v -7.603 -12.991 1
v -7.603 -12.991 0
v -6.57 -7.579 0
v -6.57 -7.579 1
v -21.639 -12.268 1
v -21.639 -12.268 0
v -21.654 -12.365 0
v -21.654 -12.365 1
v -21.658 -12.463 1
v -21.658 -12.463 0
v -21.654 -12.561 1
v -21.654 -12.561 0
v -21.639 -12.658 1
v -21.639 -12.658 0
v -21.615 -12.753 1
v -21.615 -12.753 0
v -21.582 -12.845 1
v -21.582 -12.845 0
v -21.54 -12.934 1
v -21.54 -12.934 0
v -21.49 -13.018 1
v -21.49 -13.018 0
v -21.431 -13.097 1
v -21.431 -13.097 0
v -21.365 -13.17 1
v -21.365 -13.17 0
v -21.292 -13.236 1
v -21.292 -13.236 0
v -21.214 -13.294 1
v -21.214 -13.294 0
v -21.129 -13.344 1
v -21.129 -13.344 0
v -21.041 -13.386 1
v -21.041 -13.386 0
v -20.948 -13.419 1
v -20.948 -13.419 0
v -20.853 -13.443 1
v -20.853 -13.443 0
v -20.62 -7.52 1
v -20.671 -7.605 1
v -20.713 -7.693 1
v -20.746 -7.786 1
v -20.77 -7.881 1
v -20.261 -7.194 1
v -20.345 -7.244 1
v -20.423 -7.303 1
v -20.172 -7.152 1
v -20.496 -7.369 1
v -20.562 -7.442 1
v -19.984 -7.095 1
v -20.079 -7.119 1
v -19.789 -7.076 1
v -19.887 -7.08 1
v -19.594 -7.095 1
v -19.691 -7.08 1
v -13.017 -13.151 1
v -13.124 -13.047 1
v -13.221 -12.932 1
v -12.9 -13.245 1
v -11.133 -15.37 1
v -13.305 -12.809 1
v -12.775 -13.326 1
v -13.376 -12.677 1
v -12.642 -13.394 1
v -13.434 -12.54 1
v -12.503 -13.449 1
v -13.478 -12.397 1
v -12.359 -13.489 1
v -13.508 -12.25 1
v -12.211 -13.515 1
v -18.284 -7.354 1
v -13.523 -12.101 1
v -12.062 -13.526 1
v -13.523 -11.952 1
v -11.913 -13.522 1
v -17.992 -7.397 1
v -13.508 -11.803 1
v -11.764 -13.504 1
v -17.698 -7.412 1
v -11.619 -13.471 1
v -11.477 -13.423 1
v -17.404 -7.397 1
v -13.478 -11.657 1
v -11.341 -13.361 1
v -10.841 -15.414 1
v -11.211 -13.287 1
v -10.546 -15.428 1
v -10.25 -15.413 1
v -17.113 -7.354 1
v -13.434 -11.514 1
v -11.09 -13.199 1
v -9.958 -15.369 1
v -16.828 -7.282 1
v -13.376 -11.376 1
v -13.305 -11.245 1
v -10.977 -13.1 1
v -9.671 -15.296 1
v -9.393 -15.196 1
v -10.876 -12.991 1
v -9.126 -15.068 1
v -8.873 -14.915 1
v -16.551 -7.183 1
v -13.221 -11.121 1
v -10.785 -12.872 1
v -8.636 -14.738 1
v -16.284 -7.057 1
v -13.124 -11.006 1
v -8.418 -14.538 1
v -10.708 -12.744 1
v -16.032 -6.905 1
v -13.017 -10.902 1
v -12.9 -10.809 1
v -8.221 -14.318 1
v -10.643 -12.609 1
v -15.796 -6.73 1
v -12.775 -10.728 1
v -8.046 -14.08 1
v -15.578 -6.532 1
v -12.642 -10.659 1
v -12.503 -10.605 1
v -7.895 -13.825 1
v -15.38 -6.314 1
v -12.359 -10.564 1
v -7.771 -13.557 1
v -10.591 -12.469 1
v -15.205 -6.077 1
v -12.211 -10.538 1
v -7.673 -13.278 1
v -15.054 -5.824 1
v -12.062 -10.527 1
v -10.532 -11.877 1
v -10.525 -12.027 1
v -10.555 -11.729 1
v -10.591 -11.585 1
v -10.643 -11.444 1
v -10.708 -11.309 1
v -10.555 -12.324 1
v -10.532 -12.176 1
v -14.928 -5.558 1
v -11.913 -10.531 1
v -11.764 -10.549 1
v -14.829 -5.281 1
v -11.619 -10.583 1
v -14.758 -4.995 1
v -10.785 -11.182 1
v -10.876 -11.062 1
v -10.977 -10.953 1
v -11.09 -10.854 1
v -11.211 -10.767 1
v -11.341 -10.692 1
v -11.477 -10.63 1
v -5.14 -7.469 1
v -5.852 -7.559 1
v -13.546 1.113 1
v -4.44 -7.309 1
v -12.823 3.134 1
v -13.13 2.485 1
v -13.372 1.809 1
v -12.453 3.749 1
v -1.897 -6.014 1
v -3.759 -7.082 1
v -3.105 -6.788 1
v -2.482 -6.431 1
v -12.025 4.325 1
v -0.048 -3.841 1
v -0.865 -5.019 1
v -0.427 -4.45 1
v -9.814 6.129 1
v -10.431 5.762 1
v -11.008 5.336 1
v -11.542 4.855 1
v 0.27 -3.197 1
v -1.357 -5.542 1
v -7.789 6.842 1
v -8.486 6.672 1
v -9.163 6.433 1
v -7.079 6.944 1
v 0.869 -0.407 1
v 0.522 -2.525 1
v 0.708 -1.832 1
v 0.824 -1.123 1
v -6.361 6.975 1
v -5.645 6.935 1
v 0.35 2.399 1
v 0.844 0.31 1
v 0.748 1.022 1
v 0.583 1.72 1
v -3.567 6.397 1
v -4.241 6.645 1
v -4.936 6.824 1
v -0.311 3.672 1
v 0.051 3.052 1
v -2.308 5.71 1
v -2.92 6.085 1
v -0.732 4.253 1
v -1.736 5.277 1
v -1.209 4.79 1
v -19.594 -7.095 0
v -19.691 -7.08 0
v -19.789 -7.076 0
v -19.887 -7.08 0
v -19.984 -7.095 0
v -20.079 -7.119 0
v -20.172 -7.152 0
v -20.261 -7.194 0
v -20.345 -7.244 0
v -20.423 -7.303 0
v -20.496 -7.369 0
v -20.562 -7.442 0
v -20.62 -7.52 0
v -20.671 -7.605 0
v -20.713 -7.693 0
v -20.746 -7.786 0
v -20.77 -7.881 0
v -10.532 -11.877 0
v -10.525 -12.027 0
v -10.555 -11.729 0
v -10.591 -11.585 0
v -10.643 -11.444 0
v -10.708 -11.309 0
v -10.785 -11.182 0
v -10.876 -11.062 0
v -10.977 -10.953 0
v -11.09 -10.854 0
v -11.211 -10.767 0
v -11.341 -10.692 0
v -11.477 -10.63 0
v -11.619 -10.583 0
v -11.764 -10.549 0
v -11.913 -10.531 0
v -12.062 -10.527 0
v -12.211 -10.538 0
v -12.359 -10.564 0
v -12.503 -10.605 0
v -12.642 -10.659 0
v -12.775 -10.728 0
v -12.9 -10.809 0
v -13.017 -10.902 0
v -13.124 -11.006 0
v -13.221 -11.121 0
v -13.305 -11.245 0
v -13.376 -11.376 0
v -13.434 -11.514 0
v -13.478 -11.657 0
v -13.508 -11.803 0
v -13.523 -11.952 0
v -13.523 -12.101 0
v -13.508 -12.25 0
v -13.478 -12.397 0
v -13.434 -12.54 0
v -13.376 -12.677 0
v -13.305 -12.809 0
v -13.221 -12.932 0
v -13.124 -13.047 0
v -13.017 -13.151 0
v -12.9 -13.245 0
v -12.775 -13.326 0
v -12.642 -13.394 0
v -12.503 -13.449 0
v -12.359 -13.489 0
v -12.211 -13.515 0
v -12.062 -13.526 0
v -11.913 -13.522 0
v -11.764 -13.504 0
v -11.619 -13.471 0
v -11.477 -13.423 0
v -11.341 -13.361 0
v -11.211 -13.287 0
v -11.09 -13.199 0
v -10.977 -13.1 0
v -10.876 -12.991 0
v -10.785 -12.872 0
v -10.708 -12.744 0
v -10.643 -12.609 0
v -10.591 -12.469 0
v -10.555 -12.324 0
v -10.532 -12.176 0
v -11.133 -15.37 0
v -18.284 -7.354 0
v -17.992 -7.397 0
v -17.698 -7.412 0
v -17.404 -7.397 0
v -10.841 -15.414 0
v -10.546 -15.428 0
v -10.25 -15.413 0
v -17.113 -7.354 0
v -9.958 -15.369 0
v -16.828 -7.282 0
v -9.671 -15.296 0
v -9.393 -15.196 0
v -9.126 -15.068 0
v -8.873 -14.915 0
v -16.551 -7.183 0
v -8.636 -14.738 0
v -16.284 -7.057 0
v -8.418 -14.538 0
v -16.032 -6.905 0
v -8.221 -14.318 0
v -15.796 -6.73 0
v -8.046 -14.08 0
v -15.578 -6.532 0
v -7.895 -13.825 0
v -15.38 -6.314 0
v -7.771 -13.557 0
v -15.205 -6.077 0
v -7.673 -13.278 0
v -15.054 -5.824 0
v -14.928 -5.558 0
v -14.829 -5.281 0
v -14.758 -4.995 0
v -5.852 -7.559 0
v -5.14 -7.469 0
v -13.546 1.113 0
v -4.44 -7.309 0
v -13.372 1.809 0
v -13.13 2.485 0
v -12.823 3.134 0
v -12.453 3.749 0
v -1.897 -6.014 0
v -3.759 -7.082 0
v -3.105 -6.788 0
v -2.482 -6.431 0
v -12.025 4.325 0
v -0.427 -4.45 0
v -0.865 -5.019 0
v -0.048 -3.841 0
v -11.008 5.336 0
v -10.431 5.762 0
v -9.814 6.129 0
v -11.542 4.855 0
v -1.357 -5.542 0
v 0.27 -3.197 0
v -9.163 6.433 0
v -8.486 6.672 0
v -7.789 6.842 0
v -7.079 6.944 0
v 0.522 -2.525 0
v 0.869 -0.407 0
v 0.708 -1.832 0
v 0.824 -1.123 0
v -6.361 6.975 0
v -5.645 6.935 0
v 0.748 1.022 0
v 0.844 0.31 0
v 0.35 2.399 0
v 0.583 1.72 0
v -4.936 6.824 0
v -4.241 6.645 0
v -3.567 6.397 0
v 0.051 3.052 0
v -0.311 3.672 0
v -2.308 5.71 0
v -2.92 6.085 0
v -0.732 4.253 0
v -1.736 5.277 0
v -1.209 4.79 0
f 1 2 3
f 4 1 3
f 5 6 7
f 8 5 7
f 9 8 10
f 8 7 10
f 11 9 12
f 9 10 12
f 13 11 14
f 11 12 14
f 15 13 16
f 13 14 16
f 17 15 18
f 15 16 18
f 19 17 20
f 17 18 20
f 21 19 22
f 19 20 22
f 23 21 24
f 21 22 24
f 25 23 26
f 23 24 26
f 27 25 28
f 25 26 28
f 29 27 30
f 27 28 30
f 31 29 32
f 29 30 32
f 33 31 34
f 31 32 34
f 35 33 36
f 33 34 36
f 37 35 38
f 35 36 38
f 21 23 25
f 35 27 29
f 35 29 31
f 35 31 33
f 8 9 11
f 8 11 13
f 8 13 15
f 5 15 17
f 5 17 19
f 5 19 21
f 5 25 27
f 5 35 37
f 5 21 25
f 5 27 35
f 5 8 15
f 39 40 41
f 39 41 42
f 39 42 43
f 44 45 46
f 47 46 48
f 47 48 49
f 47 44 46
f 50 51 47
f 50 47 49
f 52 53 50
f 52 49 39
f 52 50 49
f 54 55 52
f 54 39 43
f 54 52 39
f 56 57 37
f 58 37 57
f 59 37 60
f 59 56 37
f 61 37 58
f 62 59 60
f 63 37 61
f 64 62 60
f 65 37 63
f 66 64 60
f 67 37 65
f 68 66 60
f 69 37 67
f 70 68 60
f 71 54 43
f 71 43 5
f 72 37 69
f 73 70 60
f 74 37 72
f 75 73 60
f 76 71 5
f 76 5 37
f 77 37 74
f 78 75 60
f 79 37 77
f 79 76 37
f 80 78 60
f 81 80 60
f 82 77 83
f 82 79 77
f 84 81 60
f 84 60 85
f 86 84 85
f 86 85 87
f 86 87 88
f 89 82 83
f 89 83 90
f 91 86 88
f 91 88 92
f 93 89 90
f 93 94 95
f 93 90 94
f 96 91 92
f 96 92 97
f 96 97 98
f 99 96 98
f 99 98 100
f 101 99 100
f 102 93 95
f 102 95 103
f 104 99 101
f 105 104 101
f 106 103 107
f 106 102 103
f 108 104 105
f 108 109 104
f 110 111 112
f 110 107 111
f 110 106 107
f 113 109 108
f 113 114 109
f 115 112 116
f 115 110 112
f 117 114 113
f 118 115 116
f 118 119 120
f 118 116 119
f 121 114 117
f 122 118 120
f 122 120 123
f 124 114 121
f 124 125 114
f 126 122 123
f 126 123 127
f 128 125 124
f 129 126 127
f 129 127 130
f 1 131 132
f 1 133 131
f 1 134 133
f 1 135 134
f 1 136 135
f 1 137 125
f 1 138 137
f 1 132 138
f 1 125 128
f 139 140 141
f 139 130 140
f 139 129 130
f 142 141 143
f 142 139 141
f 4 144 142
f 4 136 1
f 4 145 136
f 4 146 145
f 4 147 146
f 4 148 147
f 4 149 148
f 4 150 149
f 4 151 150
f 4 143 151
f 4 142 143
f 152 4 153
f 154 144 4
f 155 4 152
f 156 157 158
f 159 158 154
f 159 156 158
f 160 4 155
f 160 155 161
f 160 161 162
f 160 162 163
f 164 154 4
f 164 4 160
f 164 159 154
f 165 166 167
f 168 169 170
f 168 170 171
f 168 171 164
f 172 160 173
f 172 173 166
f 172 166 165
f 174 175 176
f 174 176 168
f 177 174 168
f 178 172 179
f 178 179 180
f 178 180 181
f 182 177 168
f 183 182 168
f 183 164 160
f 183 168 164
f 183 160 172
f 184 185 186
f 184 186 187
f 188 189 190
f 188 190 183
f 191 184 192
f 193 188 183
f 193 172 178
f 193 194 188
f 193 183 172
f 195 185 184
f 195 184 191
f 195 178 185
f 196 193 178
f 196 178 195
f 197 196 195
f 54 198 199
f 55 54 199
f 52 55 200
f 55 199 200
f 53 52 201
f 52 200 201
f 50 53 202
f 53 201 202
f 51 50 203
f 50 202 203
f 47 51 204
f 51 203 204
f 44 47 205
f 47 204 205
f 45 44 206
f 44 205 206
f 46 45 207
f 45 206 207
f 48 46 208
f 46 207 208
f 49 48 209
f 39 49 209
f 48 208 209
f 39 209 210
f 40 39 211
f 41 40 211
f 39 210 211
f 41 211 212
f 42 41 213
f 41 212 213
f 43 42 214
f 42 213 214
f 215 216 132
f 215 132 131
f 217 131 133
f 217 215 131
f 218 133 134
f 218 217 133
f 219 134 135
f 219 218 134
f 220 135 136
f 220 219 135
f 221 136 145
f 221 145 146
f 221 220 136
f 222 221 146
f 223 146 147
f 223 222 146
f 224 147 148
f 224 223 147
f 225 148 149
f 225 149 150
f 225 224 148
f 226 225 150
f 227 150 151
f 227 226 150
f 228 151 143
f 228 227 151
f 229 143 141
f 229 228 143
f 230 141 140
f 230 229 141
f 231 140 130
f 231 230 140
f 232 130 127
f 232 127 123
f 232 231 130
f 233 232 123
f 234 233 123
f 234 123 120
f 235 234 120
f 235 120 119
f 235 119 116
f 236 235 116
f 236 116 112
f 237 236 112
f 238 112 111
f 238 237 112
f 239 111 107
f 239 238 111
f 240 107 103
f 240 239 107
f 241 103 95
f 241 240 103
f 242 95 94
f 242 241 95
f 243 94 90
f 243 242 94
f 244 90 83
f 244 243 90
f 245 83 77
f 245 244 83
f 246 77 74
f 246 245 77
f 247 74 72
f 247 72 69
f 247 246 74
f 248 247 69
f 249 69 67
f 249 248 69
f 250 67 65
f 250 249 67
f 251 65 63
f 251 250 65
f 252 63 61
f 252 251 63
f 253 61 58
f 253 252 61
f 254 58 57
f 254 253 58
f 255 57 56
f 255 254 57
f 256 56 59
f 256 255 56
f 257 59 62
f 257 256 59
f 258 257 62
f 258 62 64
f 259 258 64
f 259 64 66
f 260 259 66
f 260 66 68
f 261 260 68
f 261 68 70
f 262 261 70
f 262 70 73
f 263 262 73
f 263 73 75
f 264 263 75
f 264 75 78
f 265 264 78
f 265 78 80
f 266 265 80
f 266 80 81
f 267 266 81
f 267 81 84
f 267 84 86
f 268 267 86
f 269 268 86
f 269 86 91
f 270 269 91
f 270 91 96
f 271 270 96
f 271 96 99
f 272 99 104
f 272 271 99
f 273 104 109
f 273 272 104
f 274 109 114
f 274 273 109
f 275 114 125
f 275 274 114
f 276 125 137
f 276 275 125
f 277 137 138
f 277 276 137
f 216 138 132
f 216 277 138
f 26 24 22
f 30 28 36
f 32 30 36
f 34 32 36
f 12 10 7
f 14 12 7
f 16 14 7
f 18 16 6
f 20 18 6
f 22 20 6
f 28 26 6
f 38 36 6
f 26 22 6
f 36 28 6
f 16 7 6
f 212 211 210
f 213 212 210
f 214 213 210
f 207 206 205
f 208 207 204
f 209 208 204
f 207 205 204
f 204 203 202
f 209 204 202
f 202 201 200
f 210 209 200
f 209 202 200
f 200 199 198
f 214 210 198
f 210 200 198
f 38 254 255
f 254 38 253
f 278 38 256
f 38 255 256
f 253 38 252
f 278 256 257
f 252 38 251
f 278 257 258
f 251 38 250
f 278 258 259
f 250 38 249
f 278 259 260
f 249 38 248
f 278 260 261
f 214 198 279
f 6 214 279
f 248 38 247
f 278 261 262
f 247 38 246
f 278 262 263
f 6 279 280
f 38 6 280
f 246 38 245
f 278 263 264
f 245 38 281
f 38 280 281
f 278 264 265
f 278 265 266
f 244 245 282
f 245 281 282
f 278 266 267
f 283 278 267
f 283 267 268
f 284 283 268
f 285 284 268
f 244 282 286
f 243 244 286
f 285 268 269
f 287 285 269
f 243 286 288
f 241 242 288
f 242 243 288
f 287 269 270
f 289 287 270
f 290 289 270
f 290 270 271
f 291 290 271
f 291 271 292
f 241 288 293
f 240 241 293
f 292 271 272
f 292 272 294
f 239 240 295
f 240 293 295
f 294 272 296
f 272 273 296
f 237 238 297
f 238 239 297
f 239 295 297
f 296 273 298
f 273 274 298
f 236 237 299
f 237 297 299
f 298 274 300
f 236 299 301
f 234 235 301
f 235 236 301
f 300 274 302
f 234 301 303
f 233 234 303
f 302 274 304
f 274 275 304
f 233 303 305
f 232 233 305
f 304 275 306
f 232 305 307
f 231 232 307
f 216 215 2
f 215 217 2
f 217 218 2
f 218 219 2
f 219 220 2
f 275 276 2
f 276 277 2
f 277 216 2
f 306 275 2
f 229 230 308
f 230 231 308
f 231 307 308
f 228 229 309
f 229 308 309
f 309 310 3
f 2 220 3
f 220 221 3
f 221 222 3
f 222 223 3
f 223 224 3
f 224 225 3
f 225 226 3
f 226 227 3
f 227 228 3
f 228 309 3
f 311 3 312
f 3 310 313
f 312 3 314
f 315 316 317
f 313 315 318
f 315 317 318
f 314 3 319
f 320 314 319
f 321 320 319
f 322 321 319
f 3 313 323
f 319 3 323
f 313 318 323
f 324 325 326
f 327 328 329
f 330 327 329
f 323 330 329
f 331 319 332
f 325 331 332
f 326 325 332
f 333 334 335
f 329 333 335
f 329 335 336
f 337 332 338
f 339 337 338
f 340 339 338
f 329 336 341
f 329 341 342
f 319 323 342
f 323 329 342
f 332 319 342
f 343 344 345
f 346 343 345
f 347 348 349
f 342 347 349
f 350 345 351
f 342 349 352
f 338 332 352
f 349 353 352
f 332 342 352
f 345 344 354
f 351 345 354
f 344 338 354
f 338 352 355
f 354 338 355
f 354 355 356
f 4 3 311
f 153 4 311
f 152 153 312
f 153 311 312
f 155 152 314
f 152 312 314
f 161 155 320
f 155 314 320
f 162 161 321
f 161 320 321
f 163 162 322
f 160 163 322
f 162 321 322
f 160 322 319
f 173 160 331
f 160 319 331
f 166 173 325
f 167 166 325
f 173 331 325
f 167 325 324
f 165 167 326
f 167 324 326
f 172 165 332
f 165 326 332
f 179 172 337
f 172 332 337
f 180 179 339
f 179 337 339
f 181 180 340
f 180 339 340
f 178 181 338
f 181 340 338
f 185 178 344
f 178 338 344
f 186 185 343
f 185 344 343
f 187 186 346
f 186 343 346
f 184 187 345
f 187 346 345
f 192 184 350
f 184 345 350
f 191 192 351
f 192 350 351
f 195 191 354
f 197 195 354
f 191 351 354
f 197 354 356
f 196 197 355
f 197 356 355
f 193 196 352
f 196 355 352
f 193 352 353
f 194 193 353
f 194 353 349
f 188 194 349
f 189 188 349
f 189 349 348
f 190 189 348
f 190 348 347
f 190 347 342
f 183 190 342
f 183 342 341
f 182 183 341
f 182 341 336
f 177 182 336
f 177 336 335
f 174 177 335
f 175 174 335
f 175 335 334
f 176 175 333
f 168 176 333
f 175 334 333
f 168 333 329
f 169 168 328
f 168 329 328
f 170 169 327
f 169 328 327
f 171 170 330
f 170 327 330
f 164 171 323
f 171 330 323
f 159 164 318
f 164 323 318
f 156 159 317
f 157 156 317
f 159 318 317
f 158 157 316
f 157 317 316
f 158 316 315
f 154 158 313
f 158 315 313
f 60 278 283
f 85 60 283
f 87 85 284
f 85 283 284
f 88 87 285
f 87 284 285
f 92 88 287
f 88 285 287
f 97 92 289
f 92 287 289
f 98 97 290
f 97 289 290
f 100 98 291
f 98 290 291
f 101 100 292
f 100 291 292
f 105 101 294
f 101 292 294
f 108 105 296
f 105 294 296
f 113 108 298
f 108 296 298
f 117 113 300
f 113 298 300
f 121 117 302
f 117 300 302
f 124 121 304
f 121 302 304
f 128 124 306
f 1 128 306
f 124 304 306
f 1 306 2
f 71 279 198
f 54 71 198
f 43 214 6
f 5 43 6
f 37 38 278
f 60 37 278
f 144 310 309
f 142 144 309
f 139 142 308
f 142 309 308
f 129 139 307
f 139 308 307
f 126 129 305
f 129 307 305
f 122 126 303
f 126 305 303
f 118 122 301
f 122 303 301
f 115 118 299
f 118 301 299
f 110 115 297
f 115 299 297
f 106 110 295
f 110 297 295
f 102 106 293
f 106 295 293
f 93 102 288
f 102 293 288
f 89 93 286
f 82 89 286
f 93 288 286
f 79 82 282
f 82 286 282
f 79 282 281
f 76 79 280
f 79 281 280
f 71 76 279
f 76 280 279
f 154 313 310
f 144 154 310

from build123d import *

# Parameters (mm, degrees)
SKETCH1_R           = 1.5
BOSS_EXTRUDE1_DEPTH = 1


with BuildPart() as part:
    # Sketch1 → Boss-Extrude1 (new body)
    with BuildSketch(Plane.XY):
        with BuildLine():
            Line((-13.546388506, 1.11267473), (-14.757525988, -4.995272772))
            ThreePointArc((-14.757525988, -4.995272772), (-16.032025568, -6.905175586), (-18.283738095, -7.354473522))
            Line((-18.283738095, -7.354473522), (-19.594124086, -7.094638677))
            ThreePointArc((-19.594124086, -7.094638677), (-20.344694929, -7.244404656), (-20.769528122, -7.881038927))
            Line((-20.769528122, -7.881038927), (-21.639356034, -12.267711208))
            ThreePointArc((-21.639356034, -12.267711208), (-21.489590055, -13.018282051), (-20.852955784, -13.443115244))
            Line((-20.852955784, -13.443115244), (-11.13347013, -15.370380234))
            ThreePointArc((-11.13347013, -15.370380234), (-8.873016287, -14.915211716), (-7.60323447, -12.990508078))
            Line((-7.60323447, -12.990508078), (-6.569563046, -7.578700869))
            ThreePointArc((-6.569563046, -7.578700869), (-0.732388238, 4.25291316), (-13.546388506, 1.11267473))
        make_face()
        with Locations((-12.024833612, -12.026666232)):
            Circle(SKETCH1_R, mode=Mode.SUBTRACT)
    extrude(amount=BOSS_EXTRUDE1_DEPTH)


solid = part.part
